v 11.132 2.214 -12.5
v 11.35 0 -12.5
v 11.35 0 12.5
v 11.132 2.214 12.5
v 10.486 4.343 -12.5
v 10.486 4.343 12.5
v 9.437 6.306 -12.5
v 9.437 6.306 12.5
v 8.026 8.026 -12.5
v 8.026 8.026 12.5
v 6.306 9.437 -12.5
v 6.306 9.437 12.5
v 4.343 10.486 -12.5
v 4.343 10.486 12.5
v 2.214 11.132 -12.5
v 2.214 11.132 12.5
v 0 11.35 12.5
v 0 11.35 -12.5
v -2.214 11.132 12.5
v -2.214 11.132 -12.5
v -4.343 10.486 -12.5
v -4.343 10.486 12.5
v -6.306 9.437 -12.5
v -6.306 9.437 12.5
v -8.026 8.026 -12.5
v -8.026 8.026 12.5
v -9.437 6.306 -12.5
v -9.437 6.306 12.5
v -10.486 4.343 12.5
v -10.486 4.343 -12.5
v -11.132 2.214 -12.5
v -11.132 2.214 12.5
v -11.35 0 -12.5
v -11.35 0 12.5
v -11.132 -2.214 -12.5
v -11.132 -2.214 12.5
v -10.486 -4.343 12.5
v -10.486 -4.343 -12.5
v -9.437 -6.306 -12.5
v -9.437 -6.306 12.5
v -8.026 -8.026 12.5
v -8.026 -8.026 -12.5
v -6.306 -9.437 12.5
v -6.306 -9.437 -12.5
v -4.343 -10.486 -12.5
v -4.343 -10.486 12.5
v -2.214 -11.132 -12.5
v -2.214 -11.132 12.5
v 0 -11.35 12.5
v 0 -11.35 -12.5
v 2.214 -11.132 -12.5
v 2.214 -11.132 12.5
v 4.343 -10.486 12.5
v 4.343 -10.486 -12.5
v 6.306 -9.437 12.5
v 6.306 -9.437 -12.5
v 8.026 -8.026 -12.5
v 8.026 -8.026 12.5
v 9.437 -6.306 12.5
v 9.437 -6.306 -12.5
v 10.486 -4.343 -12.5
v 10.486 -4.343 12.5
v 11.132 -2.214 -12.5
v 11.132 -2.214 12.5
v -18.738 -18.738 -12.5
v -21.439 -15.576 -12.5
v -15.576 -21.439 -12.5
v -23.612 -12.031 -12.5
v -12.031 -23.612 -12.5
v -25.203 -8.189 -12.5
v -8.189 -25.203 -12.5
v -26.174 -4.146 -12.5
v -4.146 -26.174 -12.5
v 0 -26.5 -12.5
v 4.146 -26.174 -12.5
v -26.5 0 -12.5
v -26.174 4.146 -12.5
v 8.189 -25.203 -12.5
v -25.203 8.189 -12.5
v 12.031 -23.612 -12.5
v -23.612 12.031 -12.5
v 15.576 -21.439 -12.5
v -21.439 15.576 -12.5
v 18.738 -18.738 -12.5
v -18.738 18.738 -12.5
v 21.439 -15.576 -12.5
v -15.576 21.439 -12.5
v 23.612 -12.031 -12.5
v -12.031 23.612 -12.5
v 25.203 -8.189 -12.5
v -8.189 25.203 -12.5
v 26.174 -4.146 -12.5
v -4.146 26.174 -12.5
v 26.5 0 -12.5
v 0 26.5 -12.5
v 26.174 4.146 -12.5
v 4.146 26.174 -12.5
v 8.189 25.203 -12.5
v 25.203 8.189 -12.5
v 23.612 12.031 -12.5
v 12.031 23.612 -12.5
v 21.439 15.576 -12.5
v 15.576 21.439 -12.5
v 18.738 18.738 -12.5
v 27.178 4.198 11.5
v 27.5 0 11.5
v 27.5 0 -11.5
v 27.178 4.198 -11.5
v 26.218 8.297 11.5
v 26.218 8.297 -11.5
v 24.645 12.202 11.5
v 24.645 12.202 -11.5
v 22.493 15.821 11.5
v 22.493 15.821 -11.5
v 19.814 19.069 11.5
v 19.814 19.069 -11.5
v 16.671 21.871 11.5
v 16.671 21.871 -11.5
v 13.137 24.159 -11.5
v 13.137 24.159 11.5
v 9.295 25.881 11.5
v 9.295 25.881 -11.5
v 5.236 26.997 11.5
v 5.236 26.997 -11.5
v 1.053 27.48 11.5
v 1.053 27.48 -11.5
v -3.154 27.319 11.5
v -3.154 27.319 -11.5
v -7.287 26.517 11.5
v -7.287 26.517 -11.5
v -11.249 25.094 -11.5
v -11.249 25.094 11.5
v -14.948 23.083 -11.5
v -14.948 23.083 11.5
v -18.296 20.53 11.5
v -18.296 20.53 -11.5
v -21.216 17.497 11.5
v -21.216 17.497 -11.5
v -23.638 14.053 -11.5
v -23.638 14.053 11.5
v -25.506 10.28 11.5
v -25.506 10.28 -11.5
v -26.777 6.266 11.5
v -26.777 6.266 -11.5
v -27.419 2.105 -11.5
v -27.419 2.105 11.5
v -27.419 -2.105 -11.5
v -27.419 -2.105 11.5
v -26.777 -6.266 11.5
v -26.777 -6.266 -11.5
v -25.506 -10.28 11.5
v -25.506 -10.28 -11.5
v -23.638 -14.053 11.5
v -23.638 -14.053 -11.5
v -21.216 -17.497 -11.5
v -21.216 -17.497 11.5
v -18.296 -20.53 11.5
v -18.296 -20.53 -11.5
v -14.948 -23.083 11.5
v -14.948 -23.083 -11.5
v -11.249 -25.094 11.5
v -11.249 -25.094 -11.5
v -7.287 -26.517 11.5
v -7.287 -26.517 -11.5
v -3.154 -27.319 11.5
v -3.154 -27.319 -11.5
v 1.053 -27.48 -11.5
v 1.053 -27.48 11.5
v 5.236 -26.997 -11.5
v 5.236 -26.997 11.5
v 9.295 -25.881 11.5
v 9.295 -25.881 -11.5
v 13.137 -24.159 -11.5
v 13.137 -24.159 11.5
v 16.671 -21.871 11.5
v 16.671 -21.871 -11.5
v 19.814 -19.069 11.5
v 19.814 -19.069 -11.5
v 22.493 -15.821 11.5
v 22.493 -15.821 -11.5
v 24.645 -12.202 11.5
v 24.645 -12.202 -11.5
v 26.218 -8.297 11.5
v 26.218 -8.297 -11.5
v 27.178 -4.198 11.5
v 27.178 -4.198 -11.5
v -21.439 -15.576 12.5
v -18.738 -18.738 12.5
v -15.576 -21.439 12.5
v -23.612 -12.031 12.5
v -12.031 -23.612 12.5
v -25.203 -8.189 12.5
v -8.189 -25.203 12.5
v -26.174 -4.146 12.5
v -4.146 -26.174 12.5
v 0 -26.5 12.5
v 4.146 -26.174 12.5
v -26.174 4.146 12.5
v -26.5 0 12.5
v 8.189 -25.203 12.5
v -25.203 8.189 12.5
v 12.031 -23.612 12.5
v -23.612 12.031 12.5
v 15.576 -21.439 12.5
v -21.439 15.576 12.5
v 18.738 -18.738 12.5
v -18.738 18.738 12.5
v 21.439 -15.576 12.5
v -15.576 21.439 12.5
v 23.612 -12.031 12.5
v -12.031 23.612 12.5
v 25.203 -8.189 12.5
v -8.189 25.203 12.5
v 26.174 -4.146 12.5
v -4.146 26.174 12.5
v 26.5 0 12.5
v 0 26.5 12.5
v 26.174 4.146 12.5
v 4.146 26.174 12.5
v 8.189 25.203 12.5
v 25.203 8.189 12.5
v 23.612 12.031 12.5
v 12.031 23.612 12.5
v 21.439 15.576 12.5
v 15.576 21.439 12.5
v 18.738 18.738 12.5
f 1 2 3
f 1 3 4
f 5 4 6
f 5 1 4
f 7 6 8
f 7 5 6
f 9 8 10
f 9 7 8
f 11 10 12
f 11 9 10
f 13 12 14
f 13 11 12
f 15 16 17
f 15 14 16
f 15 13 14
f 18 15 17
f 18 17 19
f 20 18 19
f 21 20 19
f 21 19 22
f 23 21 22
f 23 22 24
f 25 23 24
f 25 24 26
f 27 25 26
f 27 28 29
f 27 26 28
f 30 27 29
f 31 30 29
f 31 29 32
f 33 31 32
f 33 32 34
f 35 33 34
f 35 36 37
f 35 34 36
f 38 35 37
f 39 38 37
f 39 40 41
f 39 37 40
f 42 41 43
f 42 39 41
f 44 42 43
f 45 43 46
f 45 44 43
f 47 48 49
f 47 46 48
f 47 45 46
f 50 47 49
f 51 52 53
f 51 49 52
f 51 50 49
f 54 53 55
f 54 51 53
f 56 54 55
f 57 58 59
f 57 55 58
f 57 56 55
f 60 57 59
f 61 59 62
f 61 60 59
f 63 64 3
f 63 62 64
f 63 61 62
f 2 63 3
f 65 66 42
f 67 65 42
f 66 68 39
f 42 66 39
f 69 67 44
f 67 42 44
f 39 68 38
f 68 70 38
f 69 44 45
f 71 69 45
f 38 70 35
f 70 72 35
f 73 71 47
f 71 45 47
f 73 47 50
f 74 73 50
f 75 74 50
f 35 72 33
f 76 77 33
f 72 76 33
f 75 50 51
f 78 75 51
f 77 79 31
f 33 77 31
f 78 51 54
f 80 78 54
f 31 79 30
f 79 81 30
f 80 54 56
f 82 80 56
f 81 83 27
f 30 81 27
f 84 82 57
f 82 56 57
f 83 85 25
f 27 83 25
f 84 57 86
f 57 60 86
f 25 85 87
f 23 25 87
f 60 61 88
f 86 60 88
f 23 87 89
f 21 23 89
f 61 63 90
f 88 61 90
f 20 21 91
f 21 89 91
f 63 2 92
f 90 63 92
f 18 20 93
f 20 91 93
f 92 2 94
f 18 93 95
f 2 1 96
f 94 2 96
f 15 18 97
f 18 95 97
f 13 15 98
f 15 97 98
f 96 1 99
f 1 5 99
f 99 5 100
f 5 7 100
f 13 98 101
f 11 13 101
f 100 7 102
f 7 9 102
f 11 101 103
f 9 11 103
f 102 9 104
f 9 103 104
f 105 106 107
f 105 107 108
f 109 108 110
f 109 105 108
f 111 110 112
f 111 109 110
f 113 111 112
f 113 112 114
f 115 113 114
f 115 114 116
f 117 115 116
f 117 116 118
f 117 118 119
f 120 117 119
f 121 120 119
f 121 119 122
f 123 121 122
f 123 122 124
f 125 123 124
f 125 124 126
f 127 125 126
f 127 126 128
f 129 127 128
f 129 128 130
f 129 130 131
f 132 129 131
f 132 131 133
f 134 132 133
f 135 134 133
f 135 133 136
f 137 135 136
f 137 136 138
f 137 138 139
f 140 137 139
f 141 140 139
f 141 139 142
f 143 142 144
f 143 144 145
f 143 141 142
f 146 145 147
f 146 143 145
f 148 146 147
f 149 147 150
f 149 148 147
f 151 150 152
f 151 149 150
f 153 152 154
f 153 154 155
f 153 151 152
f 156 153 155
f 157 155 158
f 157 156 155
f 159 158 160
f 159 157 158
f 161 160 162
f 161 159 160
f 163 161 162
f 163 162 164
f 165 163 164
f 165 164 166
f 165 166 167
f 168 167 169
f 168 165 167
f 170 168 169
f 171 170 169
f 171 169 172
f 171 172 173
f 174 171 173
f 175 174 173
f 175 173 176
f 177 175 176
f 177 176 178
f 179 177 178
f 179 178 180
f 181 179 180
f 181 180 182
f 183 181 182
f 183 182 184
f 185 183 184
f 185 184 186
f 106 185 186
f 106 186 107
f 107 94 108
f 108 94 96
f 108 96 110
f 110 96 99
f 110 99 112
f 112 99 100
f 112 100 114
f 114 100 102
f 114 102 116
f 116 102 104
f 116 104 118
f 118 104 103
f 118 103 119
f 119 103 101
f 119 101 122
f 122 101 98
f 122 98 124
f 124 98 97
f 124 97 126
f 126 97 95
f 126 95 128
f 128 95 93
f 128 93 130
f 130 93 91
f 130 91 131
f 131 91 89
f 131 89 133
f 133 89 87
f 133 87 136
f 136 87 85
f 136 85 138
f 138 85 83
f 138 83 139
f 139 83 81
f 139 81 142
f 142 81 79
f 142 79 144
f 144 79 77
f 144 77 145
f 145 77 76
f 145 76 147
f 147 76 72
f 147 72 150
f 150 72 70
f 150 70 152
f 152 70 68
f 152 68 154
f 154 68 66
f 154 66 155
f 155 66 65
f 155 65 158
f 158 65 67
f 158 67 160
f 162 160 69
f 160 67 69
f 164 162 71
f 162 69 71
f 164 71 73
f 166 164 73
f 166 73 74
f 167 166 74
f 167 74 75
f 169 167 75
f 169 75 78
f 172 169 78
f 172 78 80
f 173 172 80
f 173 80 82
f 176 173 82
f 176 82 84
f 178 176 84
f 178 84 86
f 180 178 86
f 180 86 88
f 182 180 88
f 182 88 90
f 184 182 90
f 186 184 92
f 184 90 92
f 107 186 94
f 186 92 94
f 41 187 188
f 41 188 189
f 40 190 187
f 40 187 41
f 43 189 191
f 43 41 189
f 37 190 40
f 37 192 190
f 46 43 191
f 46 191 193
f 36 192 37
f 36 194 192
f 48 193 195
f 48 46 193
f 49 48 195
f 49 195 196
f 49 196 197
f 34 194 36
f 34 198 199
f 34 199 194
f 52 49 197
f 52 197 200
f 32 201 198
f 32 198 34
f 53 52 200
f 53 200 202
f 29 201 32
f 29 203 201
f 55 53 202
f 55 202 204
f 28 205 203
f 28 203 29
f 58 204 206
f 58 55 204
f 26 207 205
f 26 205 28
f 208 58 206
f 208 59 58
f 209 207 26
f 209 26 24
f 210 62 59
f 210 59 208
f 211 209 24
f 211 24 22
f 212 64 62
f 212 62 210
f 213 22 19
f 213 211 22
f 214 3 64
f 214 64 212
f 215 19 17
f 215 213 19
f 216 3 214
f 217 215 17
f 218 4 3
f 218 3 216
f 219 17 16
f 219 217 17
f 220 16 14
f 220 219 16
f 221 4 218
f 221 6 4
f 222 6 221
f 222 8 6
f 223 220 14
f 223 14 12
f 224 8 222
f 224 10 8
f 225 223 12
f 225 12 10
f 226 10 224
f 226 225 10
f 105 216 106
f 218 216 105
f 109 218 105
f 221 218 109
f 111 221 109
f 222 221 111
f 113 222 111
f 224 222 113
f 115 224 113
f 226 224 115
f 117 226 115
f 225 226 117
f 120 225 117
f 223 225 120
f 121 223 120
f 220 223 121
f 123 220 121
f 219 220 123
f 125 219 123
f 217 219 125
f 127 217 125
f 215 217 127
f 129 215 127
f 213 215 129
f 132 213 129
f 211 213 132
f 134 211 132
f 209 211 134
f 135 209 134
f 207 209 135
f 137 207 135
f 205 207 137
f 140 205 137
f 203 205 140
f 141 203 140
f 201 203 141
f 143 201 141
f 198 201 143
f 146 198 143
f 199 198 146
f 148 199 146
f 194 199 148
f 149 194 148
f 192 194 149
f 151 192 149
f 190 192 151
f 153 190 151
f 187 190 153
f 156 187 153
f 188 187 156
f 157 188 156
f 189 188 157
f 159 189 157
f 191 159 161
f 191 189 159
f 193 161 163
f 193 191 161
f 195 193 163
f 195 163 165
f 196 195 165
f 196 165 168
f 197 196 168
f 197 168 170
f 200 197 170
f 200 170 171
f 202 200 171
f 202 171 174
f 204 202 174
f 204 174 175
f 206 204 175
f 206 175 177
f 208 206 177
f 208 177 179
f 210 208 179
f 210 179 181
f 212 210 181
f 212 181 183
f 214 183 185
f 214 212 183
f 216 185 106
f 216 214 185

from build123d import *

# Parameters (mm, degrees)
SKETCH1_R               = 27.5
BOSS_EXTRUDE1_DEPTH     = 12.5
CUT_EXTRUDE1_DEPTH      = 41.850336596
CUT_EXTRUDE1_DEPTH_BACK = 41.850336596
SKETCH2_R               = 11.35
CHAMFER1_SIZE           = 1


with BuildPart() as part:
    # Sketch1 → Boss-Extrude1 (new, symmetric)
    with BuildSketch(Plane.XY):
        Circle(SKETCH1_R)
    extrude(amount=BOSS_EXTRUDE1_DEPTH, both=True)

    # Sketch2 → Cut-Extrude1 (cut, two sides: drawn at the far end of the back side and taken through both)
    with BuildSketch(Plane.XY.offset(-CUT_EXTRUDE1_DEPTH_BACK)):
        Circle(SKETCH2_R)
    extrude(amount=CUT_EXTRUDE1_DEPTH + CUT_EXTRUDE1_DEPTH_BACK, mode=Mode.SUBTRACT)

    # Chamfer1
    chamfer1_edges = [part.edges().sort_by_distance(p)[0] for p in [
        (-27.5, 0, -12.5),
        (-27.5, 0, 12.5),
    ]]
    chamfer(chamfer1_edges, length=CHAMFER1_SIZE)


solid = part.part
